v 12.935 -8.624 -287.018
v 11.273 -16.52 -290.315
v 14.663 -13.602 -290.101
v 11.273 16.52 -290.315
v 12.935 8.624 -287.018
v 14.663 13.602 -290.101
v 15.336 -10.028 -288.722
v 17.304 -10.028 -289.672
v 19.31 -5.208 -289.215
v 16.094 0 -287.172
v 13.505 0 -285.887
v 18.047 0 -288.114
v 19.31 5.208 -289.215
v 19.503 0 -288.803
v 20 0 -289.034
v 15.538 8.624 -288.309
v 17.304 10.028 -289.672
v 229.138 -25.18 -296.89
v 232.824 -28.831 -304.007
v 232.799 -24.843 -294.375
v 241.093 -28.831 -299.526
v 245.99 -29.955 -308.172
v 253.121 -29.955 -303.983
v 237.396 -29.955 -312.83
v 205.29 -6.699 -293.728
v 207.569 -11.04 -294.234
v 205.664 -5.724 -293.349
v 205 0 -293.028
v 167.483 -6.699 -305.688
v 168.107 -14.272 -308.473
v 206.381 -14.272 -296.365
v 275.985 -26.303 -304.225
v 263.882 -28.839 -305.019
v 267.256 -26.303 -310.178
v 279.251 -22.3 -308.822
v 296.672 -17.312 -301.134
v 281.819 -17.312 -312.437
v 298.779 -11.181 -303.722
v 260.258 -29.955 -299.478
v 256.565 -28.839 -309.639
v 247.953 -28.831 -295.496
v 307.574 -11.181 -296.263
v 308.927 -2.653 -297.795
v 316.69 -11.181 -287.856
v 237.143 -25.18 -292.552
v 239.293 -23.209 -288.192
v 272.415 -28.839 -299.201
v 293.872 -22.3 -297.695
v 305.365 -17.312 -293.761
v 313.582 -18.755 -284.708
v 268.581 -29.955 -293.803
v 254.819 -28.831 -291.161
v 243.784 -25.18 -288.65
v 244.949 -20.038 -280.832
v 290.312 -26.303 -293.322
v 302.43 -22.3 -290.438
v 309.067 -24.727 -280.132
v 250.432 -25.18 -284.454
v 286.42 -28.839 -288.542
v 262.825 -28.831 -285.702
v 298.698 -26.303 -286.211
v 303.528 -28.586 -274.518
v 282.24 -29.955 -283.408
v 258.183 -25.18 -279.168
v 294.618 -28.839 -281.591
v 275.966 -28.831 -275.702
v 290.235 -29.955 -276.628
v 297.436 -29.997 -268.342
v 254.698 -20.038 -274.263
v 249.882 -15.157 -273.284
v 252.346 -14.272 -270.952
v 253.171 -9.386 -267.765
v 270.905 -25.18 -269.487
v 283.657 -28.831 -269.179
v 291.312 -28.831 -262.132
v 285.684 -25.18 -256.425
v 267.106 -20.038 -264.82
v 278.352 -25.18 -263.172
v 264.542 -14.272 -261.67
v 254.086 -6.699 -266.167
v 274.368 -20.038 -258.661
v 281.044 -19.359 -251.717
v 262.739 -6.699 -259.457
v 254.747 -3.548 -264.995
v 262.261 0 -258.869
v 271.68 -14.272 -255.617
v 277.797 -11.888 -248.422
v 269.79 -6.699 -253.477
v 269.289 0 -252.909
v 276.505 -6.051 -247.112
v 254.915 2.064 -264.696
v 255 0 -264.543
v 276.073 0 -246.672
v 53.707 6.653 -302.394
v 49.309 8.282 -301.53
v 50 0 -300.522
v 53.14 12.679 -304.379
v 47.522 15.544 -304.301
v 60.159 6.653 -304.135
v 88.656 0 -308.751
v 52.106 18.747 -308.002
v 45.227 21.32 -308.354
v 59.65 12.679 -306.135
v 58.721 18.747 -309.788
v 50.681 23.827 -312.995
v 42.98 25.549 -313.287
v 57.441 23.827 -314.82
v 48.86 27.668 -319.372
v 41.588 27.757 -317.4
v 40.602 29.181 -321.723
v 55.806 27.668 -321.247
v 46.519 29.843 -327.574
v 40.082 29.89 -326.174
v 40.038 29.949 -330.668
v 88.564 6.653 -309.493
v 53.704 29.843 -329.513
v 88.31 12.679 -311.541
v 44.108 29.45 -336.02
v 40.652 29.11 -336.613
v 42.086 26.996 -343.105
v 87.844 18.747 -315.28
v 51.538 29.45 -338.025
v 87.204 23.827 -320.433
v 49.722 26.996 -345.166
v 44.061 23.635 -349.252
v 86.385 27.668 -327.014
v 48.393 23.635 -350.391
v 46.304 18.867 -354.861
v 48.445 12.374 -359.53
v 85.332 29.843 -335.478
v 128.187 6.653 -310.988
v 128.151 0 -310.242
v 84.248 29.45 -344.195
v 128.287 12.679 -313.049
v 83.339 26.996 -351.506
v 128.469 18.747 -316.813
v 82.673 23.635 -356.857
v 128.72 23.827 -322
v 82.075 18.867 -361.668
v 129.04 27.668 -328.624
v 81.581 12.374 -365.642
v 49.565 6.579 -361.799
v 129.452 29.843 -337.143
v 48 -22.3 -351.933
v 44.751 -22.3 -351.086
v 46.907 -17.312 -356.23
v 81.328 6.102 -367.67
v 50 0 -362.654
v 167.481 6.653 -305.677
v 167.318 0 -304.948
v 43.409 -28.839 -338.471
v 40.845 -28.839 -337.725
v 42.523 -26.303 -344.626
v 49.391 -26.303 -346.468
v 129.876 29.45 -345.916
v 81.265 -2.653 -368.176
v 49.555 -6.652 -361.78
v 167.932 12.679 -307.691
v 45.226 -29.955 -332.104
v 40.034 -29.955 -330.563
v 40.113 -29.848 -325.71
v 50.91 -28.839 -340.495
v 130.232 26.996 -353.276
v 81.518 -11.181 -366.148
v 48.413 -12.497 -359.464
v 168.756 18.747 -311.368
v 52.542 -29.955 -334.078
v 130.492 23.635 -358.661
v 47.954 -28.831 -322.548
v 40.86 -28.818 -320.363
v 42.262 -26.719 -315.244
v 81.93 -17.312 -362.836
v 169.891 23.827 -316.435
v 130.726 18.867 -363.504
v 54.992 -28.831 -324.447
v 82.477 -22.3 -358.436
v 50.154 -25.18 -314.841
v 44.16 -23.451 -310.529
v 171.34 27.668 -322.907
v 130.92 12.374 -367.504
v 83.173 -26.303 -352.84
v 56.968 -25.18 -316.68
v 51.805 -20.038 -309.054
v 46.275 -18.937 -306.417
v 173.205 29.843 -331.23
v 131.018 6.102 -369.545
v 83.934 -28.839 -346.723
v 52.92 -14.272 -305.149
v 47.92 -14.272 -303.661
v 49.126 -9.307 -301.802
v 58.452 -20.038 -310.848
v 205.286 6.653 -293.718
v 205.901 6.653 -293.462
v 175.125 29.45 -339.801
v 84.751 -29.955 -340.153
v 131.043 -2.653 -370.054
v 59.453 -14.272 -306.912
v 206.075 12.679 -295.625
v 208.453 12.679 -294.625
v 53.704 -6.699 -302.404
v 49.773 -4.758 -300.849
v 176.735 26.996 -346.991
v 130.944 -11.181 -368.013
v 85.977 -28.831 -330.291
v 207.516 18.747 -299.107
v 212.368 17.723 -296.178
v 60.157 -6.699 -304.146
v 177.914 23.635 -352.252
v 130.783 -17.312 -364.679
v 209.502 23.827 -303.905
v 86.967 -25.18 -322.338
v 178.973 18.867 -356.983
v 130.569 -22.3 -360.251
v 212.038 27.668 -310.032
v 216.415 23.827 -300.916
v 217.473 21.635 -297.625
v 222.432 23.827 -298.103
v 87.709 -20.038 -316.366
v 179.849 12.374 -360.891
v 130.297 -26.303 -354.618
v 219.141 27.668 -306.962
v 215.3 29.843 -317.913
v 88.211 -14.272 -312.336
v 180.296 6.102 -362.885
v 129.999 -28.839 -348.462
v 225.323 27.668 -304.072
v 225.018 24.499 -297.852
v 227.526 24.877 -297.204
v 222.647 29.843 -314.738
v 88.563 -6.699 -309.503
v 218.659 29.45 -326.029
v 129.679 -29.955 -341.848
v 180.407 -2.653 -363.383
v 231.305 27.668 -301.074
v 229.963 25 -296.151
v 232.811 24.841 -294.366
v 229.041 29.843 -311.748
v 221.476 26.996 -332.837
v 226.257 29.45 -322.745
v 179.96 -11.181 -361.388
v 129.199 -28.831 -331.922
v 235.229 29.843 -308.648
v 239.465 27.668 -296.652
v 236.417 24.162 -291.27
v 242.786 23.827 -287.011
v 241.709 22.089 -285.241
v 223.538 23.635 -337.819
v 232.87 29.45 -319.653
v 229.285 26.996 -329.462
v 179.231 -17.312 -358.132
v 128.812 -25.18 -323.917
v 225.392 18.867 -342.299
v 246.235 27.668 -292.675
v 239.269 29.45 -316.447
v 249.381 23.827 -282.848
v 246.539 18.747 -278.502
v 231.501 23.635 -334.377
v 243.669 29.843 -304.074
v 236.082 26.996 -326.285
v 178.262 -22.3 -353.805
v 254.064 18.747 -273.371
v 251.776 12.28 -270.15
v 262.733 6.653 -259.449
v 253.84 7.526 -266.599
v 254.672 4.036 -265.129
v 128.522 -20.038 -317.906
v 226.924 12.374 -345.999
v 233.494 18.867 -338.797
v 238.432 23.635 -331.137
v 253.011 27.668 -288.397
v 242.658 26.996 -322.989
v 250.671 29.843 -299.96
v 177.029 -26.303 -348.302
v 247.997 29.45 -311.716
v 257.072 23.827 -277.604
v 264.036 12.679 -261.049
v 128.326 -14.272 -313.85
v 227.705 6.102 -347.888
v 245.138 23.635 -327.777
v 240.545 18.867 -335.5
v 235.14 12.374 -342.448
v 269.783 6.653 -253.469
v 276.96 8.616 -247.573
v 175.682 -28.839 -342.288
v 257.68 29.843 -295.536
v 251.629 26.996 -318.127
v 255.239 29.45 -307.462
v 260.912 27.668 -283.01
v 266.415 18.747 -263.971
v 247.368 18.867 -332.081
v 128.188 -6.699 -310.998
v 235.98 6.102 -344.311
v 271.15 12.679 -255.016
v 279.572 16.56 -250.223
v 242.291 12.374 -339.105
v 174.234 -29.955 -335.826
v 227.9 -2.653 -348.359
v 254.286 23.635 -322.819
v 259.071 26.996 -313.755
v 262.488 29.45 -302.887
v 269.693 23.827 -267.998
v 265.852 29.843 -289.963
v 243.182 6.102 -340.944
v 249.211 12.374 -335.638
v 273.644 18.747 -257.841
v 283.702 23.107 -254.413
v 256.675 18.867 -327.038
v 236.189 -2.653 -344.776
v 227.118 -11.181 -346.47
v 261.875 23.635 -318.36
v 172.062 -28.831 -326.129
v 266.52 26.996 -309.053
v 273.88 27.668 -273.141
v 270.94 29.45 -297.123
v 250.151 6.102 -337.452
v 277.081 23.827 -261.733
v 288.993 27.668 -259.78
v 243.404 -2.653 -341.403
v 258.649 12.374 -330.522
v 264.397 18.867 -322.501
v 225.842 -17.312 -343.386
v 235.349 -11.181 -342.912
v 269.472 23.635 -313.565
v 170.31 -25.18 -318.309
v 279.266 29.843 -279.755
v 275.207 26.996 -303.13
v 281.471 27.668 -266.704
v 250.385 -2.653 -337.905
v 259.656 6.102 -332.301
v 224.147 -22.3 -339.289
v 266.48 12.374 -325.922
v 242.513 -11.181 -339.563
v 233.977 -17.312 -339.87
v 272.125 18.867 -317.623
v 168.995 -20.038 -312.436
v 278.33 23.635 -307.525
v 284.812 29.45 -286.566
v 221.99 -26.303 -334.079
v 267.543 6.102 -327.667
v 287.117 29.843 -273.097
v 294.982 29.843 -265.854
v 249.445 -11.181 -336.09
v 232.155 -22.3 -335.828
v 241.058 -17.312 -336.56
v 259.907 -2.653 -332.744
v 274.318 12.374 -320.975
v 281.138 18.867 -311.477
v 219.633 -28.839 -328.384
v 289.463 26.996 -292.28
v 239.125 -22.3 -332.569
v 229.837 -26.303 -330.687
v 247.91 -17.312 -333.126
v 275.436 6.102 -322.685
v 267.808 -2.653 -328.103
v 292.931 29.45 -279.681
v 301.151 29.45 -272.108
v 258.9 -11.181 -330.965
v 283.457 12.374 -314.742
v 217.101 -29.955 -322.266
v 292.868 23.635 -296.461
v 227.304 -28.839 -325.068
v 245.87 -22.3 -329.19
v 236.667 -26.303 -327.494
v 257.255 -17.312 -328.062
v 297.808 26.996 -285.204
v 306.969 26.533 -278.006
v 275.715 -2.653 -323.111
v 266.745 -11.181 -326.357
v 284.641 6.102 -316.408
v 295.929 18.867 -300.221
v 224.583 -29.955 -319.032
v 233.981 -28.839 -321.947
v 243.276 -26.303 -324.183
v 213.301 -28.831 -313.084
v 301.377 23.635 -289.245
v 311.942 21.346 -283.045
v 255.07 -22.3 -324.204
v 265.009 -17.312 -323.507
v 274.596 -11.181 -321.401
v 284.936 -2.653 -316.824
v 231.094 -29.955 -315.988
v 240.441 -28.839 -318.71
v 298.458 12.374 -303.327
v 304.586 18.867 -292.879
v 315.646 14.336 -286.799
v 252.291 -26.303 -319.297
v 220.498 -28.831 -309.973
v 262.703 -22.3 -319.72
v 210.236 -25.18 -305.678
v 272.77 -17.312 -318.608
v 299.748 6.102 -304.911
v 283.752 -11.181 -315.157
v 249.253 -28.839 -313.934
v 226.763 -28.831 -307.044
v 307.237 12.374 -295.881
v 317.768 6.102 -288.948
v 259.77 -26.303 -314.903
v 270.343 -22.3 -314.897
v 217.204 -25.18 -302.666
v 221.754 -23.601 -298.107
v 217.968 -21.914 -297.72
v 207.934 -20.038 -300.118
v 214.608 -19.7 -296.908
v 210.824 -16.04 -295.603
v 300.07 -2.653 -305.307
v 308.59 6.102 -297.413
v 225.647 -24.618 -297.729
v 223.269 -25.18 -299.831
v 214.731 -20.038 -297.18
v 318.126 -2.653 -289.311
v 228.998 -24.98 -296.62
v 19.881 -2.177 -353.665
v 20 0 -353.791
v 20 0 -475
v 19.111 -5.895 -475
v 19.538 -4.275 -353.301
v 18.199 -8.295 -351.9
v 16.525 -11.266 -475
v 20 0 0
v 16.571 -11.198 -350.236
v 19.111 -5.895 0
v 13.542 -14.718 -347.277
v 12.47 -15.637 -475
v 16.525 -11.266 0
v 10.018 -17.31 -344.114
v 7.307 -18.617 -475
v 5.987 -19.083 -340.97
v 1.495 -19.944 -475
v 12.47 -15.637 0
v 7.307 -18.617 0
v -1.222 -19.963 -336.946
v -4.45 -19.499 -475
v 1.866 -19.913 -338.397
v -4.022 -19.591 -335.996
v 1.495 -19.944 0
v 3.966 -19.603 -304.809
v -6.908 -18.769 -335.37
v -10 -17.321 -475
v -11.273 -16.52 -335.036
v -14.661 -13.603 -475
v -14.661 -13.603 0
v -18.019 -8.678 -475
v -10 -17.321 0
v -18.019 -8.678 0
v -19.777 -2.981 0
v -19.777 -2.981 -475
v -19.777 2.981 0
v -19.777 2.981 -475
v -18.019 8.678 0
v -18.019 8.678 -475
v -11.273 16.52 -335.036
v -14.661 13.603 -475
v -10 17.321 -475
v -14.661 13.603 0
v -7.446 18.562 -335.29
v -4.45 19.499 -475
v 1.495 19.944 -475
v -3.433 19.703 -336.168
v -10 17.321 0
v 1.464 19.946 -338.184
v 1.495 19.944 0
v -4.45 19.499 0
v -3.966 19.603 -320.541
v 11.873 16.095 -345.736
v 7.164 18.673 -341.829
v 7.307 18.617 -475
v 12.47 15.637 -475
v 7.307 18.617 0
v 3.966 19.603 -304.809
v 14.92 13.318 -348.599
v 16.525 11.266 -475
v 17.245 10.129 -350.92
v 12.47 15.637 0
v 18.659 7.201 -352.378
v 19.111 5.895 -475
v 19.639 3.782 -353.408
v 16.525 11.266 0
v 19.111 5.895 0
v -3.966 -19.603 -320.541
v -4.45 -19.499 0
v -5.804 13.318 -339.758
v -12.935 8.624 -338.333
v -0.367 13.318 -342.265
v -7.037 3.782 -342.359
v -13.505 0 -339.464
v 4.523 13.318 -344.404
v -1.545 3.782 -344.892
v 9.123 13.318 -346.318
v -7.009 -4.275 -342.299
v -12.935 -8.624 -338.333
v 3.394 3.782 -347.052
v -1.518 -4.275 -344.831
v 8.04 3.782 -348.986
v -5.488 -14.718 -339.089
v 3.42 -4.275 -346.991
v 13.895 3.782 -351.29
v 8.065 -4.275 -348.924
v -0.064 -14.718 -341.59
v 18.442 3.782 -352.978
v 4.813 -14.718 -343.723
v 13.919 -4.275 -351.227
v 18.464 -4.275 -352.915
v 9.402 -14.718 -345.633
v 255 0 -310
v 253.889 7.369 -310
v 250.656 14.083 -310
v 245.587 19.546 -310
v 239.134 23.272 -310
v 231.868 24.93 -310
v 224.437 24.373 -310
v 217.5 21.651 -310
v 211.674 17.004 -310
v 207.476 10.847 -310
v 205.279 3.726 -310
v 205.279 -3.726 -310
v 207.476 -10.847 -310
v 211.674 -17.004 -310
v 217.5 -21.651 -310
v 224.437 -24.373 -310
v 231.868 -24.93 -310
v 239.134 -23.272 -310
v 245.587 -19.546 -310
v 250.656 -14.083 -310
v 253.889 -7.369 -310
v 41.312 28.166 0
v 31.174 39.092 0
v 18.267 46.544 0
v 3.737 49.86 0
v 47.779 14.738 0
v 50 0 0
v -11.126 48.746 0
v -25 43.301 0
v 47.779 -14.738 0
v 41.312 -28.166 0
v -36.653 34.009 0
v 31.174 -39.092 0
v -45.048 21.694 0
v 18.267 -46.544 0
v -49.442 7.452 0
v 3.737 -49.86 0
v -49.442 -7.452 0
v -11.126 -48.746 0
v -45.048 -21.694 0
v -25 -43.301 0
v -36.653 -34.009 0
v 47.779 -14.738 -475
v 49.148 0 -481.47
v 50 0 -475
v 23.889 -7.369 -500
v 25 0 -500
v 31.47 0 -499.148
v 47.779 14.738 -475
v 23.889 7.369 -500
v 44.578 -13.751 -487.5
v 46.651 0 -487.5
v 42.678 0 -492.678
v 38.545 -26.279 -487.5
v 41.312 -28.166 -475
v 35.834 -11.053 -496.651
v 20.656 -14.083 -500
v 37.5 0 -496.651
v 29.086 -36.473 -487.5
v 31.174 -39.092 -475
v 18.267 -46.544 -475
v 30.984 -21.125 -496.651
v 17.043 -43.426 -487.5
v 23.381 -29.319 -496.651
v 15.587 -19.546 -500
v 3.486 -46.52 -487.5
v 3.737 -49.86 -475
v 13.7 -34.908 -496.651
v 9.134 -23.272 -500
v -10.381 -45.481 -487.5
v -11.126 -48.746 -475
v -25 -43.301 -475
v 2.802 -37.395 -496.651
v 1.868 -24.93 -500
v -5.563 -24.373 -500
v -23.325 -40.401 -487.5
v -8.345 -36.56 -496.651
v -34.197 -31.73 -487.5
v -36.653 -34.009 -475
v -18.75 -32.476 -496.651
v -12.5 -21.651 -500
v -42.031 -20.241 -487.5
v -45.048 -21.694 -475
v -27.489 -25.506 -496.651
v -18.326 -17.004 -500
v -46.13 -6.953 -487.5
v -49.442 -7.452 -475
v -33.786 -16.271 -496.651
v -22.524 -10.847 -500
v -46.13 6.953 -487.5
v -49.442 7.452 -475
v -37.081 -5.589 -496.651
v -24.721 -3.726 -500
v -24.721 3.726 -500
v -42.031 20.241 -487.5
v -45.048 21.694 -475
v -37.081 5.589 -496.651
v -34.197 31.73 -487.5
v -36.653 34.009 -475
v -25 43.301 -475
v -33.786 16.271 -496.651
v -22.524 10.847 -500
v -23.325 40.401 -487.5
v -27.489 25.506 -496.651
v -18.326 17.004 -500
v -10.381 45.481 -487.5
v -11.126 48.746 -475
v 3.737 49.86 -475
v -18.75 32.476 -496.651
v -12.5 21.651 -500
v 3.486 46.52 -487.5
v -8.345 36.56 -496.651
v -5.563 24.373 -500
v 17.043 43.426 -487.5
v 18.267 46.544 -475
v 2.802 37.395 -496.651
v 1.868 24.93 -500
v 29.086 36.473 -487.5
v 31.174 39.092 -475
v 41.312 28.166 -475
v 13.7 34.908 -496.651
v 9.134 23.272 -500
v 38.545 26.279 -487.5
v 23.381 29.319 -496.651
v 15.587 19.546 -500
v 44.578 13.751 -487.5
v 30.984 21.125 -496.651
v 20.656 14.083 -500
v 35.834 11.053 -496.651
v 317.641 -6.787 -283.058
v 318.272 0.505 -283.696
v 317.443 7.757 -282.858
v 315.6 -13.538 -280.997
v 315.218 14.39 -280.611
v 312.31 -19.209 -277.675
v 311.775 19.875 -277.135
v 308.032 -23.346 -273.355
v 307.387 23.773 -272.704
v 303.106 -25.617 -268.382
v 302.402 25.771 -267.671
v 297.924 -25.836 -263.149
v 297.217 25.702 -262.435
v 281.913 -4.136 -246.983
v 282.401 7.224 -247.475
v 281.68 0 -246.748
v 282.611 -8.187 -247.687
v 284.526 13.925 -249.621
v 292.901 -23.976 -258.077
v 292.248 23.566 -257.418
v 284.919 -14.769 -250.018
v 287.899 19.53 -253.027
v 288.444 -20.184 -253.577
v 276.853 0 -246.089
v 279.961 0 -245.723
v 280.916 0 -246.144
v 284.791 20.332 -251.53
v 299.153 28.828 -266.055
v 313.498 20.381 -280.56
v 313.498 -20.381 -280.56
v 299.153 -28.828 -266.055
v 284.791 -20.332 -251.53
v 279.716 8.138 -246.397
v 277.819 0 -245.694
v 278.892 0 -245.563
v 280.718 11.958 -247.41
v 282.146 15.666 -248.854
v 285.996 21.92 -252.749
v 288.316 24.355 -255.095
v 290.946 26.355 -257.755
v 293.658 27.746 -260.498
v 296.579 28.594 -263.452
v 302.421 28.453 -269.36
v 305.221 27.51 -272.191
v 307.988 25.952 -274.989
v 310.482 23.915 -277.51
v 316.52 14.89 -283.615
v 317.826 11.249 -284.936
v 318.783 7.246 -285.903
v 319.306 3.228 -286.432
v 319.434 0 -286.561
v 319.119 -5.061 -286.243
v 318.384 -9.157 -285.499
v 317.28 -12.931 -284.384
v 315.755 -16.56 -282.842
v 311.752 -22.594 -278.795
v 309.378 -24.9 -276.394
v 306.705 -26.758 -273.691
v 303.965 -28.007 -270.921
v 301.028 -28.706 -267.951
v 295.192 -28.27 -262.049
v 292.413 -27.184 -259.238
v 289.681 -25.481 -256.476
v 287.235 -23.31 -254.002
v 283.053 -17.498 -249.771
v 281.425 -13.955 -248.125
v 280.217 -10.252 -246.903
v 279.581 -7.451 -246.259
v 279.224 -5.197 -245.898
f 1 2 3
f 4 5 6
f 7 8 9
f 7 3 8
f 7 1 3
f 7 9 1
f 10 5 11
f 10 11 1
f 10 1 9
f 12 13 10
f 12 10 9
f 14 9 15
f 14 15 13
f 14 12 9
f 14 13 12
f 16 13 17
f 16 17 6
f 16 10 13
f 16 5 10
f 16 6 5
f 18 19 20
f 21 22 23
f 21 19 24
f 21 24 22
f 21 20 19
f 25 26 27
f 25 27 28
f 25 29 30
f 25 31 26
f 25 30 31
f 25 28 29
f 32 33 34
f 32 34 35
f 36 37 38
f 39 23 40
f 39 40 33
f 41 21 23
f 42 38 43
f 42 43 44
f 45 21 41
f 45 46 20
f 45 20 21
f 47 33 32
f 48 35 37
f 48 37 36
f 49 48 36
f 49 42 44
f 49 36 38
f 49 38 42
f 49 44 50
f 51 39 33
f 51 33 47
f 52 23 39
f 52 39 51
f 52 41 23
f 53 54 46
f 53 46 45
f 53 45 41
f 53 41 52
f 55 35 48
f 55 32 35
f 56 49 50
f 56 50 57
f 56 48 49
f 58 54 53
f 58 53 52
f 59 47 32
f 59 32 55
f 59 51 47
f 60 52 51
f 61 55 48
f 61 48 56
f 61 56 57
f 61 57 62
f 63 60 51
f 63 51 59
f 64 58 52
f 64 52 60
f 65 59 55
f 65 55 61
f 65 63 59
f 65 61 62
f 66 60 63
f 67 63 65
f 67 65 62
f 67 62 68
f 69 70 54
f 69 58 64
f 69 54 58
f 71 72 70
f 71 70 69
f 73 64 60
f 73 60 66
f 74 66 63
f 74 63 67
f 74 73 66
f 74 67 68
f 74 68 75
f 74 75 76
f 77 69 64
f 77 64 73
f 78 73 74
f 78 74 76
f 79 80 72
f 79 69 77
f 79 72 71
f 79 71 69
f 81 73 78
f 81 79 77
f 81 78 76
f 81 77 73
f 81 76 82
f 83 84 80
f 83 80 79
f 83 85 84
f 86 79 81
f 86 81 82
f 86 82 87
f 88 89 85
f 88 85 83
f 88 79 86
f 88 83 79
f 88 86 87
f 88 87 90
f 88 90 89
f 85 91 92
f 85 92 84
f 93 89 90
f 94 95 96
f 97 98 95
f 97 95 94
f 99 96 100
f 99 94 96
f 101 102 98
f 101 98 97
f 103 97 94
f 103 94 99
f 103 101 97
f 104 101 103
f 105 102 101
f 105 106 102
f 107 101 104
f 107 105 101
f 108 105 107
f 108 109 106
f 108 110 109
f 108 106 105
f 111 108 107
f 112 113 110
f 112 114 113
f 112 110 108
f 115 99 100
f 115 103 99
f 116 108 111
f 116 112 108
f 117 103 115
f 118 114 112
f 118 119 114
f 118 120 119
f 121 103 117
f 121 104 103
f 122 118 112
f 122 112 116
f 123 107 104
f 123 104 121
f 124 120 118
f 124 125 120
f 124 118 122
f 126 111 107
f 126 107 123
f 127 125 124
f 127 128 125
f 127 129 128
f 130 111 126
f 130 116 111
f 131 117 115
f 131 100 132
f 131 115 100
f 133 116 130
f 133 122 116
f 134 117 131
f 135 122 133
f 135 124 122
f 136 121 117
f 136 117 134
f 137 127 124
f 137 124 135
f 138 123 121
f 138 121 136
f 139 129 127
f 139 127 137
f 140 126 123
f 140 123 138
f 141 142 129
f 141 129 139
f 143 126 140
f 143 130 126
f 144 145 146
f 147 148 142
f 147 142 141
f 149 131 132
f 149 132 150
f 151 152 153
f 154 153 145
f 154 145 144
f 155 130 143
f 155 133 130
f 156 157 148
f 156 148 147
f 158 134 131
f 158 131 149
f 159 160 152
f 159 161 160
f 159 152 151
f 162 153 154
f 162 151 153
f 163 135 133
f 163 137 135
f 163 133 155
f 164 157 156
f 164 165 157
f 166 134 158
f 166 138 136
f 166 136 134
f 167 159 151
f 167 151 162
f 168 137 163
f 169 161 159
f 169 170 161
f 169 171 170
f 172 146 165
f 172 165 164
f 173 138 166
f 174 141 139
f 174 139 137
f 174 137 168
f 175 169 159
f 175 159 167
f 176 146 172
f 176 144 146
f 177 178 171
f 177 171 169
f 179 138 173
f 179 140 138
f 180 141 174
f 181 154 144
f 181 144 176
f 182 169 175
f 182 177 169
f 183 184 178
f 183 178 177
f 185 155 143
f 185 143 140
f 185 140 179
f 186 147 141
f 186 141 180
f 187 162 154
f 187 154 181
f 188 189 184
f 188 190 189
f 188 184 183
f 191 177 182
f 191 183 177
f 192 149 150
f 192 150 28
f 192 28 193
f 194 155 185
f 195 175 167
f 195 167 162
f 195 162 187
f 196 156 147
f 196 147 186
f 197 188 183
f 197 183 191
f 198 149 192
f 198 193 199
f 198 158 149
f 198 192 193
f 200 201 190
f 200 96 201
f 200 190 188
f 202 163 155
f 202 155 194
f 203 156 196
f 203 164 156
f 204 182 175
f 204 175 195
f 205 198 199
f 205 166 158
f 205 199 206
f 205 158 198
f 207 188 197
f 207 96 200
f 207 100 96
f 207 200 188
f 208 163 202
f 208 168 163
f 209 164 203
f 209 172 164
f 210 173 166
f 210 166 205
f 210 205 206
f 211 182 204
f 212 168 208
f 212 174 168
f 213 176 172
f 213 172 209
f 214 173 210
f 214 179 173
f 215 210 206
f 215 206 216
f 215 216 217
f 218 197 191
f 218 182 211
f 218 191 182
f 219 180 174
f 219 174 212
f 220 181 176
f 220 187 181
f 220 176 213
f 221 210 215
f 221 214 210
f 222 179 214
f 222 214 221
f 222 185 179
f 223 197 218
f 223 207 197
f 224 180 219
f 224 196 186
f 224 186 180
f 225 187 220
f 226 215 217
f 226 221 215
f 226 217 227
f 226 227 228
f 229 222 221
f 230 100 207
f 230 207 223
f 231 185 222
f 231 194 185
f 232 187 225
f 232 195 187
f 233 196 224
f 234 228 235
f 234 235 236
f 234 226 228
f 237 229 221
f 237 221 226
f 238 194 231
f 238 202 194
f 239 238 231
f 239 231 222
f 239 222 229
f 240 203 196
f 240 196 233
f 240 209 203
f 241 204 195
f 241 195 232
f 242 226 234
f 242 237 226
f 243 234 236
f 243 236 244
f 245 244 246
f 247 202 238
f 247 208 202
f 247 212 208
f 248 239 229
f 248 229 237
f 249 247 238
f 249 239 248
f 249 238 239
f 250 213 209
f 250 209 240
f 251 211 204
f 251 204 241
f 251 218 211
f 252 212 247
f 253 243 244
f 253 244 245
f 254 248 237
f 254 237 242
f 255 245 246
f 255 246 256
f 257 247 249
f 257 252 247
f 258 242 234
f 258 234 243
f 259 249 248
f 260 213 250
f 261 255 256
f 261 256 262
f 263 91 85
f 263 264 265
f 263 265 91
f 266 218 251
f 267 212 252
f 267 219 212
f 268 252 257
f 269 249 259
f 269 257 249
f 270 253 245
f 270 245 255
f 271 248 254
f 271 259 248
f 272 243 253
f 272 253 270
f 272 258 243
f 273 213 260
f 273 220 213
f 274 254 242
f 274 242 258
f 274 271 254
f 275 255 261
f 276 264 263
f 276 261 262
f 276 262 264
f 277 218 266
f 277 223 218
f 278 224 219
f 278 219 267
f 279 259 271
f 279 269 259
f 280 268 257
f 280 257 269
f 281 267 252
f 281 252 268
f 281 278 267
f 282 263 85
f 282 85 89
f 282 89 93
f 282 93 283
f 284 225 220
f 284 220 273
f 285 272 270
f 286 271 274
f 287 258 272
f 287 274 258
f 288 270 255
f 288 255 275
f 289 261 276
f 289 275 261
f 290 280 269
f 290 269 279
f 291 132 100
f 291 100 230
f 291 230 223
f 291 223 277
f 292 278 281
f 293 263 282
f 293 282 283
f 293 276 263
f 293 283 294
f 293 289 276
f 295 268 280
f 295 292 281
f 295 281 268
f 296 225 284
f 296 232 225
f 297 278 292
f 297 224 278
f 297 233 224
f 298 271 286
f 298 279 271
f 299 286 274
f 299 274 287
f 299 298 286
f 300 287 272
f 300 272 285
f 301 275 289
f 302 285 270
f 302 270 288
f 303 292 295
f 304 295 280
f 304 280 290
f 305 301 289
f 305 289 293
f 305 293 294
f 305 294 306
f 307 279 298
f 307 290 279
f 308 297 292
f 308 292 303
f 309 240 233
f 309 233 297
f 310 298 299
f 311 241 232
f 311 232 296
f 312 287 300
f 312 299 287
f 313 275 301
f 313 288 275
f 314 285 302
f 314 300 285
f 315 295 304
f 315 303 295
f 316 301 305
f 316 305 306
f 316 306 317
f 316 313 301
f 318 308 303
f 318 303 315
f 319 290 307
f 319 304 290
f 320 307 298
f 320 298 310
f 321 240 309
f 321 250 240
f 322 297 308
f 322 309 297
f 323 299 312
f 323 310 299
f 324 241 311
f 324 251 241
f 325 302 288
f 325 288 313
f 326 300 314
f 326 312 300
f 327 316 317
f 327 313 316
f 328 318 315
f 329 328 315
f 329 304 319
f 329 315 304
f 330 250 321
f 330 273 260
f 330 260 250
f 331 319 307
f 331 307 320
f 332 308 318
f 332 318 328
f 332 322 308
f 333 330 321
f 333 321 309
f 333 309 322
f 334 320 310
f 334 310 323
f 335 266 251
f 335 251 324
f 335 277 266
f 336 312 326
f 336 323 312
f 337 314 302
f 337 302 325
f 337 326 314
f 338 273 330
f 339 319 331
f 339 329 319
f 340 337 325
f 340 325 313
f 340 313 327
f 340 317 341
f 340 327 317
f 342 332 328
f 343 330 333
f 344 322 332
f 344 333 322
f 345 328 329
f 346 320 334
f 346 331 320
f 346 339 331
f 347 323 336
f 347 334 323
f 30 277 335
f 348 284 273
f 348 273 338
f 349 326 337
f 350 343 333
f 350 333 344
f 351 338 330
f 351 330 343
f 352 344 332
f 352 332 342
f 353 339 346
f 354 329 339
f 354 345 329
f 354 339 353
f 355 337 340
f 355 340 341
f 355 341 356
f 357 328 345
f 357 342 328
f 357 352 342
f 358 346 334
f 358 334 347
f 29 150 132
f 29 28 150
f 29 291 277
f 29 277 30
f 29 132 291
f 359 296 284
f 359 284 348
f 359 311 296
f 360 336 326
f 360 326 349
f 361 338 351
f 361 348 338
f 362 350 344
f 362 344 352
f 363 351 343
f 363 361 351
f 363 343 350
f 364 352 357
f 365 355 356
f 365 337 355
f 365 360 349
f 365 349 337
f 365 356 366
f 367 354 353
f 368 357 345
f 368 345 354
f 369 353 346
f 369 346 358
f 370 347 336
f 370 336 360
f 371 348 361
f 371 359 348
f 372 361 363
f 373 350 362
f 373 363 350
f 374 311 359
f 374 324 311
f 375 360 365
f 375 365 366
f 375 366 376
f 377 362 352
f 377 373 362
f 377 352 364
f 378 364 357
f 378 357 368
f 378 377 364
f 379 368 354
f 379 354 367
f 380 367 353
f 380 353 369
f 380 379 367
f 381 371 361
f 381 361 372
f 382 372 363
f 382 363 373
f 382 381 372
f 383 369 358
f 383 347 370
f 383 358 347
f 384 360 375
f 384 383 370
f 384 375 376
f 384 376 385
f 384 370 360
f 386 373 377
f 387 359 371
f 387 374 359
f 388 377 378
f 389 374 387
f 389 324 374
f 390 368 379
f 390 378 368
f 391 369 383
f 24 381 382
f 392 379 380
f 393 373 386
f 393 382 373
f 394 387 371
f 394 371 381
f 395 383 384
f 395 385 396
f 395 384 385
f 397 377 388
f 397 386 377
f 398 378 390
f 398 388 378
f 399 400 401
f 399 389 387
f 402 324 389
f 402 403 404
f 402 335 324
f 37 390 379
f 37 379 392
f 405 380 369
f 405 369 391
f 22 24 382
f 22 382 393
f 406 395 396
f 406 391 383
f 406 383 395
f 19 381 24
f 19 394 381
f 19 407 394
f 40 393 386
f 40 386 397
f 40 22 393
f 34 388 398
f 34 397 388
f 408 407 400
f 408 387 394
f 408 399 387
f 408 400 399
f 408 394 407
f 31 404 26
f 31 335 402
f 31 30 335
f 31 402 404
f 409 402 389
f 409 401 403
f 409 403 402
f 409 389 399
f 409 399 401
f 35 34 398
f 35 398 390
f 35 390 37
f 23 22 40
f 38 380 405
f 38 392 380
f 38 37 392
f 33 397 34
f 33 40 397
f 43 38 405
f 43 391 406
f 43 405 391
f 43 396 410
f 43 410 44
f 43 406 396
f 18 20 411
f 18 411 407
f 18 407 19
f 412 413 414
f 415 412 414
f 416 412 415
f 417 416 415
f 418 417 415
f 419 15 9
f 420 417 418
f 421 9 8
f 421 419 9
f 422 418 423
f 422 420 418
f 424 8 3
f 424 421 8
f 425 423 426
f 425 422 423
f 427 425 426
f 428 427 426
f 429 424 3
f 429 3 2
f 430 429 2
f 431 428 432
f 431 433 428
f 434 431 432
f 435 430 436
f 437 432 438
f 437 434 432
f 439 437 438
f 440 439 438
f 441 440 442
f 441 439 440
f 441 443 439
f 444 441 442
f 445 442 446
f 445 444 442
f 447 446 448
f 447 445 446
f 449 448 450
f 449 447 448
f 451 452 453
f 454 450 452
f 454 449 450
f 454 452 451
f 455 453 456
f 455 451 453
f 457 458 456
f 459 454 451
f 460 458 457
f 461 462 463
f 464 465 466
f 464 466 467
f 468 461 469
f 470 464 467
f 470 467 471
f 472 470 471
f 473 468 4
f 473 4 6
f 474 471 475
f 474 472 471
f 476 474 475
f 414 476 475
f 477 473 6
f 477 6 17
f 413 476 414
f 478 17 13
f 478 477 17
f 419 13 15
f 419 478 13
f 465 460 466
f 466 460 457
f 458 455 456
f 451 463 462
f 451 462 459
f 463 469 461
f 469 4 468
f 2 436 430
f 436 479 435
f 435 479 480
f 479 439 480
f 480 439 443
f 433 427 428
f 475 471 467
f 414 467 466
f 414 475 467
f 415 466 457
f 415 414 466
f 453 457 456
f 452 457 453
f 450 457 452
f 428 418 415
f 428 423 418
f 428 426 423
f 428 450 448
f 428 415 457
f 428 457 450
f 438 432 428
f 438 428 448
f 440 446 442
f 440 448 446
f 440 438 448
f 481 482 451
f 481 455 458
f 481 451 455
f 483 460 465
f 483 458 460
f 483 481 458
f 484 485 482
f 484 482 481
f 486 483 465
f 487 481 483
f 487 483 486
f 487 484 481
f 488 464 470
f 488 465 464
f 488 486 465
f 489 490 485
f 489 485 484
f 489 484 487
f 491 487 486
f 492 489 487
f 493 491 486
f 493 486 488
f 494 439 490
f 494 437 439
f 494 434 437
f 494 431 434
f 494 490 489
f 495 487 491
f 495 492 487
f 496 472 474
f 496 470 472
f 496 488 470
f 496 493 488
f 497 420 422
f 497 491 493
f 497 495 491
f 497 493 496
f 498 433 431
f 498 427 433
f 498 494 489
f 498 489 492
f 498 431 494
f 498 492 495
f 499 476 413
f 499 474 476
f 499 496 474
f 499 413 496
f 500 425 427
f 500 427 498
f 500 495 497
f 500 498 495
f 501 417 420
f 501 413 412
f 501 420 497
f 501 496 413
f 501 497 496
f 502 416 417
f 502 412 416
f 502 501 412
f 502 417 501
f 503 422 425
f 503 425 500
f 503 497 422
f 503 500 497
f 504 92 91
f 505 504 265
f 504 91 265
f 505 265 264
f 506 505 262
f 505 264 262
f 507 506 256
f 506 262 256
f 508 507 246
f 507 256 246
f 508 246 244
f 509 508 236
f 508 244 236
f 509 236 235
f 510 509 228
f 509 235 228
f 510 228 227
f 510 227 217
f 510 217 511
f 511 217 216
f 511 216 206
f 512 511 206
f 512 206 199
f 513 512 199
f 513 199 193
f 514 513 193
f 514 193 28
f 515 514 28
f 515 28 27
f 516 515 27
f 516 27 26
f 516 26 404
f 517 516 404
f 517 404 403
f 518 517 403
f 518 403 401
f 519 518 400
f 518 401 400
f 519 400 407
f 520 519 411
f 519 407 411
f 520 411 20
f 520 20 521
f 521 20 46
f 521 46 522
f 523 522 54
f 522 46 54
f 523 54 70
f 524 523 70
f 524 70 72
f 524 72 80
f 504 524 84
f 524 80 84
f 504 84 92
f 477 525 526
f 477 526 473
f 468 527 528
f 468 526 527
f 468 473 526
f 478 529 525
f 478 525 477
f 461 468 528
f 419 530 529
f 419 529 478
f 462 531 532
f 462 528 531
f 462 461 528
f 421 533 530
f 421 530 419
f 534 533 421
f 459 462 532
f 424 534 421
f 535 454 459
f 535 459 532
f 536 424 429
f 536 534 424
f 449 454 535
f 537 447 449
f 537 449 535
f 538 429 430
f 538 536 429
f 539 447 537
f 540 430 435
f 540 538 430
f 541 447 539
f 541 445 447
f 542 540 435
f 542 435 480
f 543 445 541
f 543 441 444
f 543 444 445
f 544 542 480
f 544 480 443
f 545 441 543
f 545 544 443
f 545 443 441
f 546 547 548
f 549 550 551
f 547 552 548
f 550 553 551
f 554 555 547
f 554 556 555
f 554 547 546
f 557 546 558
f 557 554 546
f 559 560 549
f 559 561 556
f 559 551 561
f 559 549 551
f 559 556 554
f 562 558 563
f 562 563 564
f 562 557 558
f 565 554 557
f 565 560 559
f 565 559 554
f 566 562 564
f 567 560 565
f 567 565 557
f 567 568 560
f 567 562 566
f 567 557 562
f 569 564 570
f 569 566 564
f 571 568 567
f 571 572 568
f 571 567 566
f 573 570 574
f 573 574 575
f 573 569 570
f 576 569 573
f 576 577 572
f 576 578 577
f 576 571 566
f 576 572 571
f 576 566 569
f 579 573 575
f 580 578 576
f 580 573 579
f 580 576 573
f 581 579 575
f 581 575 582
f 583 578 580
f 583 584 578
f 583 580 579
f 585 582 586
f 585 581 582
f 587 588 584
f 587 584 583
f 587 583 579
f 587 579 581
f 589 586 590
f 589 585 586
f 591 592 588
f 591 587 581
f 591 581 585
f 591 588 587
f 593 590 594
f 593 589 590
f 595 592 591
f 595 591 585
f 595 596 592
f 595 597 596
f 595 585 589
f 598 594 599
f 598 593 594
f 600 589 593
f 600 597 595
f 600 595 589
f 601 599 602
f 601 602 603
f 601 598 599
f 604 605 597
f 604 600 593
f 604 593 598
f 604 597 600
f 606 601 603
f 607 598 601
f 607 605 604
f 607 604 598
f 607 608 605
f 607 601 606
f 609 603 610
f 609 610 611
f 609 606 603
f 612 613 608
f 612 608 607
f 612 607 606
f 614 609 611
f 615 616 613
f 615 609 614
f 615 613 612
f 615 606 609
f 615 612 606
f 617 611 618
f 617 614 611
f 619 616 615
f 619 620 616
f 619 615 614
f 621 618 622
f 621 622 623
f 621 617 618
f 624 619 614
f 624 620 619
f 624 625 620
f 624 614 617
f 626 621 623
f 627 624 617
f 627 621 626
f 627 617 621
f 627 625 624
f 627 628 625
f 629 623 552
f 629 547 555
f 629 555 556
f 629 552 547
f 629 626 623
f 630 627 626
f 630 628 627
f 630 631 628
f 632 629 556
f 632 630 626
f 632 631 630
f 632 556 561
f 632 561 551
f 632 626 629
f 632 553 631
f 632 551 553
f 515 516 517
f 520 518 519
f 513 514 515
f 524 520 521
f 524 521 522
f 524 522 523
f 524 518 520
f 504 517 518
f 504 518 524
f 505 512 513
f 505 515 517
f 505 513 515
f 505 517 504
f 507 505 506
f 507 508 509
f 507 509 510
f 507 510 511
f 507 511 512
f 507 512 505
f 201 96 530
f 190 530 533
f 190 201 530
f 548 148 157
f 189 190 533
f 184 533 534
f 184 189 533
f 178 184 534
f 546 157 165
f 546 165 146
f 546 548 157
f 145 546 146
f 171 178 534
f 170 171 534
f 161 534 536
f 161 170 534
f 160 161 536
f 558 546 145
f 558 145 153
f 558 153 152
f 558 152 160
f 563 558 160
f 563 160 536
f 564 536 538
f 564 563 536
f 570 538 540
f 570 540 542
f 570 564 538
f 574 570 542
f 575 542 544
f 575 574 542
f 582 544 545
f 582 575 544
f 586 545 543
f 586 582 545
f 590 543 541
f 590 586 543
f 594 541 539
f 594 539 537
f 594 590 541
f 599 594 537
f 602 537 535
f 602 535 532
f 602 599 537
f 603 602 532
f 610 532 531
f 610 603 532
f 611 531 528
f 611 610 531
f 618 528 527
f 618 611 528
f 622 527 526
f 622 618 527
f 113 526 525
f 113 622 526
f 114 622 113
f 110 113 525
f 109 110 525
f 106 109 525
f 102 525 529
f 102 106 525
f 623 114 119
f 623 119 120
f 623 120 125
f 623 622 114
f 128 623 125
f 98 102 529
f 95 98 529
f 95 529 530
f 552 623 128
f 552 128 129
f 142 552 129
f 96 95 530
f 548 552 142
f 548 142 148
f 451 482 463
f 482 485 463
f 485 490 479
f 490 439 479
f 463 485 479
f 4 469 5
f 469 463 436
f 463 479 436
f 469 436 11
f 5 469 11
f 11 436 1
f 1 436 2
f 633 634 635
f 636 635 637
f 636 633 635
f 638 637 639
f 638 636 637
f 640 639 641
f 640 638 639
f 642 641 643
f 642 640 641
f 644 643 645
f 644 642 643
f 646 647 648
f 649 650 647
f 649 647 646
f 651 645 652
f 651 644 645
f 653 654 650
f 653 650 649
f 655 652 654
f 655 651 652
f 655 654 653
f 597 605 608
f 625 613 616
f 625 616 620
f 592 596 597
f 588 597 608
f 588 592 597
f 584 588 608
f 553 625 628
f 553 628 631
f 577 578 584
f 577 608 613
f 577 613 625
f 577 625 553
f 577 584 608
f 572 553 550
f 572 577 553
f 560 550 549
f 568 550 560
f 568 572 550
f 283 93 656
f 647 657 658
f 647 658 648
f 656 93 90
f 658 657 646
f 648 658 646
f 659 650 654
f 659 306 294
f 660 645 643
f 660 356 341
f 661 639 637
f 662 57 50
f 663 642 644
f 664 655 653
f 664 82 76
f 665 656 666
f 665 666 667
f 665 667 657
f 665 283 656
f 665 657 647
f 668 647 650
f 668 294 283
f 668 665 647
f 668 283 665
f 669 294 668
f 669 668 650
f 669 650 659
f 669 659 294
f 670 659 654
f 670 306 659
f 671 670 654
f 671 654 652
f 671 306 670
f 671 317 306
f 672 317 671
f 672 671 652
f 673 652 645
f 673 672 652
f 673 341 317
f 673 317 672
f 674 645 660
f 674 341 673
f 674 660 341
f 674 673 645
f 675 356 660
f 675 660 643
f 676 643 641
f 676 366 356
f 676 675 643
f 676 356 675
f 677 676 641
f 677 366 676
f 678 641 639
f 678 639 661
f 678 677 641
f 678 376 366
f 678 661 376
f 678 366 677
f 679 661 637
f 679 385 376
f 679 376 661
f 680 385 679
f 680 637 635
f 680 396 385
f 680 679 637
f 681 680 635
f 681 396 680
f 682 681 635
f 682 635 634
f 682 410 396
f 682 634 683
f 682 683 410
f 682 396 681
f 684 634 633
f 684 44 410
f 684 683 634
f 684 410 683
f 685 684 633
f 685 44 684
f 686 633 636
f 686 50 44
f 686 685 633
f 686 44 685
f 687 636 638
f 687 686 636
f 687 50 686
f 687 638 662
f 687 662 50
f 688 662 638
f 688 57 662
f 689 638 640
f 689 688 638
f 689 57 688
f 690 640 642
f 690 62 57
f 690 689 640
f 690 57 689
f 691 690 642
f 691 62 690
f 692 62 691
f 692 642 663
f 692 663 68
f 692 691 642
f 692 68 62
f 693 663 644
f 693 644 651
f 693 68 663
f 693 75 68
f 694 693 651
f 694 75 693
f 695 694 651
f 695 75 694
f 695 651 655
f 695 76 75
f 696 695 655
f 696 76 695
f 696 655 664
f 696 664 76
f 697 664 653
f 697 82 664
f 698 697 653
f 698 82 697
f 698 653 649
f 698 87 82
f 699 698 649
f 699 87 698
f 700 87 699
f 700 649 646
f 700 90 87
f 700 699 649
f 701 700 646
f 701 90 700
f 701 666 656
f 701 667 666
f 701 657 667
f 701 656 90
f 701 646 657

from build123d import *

# Parameters (mm, degrees)
SWEEP1_PROFILE_R   = 30
SKETCH32_R         = 25
CUT_EXTRUDE1_DEPTH = 310
FILLET1_R          = 4


with BuildPart() as part:
    # Sketch1 → Revolve1 (revolve)
    with BuildSketch(Plane(origin=(0, 0, 0), x_dir=(1, 0, 0), z_dir=(0, 1, 0))):
        with BuildLine():
            Line((0, 474.99999), (20, 474.99999))
            Line((20, 474.99999), (20, 0))
            Line((20, 0), (50, 0))
            Line((50, 0), (50, 475))
            ThreePointArc((50, 475), (42.67766953, 492.67766953), (25, 500))
            Line((25, 500), (0, 500))
            Line((0, 500), (0, 474.99999))
        make_face()
    revolve(axis=Axis((0, 0, 0), (0, 0, -1)))

    # Sweep1: sweep along a curve in space
    with BuildLine() as sweep1_path:
        ThreePointArc((0, 0, -312.675247361), (157.645703228, 0, -337.320292822), (300, 0, -265.245330439))
    # Sweep1 profile (on start of the path) → Sweep1 (sweep)
    with BuildSketch(Plane(origin=(0, 0, -312.675247361), x_dir=(0.45016951101566693, 0, 0.892943117646312), z_dir=(0.892943117646312, 0, -0.45016951101566693))):
        Circle(SWEEP1_PROFILE_R)
    sweep(path=sweep1_path.line)

    # Sketch32 → Cut-Extrude1 (cut)
    with BuildSketch(Plane.XY):
        with Locations((230, 0)):
            Circle(SKETCH32_R)
    extrude(amount=-CUT_EXTRUDE1_DEPTH, mode=Mode.SUBTRACT)

    # Fillet1
    fillet1_edges = [part.edges().sort_by_distance(p)[0] for p in [
        (321.110299285, 0, -286.560941247),
    ]]
    fillet(fillet1_edges, radius=FILLET1_R)


solid = part.part
